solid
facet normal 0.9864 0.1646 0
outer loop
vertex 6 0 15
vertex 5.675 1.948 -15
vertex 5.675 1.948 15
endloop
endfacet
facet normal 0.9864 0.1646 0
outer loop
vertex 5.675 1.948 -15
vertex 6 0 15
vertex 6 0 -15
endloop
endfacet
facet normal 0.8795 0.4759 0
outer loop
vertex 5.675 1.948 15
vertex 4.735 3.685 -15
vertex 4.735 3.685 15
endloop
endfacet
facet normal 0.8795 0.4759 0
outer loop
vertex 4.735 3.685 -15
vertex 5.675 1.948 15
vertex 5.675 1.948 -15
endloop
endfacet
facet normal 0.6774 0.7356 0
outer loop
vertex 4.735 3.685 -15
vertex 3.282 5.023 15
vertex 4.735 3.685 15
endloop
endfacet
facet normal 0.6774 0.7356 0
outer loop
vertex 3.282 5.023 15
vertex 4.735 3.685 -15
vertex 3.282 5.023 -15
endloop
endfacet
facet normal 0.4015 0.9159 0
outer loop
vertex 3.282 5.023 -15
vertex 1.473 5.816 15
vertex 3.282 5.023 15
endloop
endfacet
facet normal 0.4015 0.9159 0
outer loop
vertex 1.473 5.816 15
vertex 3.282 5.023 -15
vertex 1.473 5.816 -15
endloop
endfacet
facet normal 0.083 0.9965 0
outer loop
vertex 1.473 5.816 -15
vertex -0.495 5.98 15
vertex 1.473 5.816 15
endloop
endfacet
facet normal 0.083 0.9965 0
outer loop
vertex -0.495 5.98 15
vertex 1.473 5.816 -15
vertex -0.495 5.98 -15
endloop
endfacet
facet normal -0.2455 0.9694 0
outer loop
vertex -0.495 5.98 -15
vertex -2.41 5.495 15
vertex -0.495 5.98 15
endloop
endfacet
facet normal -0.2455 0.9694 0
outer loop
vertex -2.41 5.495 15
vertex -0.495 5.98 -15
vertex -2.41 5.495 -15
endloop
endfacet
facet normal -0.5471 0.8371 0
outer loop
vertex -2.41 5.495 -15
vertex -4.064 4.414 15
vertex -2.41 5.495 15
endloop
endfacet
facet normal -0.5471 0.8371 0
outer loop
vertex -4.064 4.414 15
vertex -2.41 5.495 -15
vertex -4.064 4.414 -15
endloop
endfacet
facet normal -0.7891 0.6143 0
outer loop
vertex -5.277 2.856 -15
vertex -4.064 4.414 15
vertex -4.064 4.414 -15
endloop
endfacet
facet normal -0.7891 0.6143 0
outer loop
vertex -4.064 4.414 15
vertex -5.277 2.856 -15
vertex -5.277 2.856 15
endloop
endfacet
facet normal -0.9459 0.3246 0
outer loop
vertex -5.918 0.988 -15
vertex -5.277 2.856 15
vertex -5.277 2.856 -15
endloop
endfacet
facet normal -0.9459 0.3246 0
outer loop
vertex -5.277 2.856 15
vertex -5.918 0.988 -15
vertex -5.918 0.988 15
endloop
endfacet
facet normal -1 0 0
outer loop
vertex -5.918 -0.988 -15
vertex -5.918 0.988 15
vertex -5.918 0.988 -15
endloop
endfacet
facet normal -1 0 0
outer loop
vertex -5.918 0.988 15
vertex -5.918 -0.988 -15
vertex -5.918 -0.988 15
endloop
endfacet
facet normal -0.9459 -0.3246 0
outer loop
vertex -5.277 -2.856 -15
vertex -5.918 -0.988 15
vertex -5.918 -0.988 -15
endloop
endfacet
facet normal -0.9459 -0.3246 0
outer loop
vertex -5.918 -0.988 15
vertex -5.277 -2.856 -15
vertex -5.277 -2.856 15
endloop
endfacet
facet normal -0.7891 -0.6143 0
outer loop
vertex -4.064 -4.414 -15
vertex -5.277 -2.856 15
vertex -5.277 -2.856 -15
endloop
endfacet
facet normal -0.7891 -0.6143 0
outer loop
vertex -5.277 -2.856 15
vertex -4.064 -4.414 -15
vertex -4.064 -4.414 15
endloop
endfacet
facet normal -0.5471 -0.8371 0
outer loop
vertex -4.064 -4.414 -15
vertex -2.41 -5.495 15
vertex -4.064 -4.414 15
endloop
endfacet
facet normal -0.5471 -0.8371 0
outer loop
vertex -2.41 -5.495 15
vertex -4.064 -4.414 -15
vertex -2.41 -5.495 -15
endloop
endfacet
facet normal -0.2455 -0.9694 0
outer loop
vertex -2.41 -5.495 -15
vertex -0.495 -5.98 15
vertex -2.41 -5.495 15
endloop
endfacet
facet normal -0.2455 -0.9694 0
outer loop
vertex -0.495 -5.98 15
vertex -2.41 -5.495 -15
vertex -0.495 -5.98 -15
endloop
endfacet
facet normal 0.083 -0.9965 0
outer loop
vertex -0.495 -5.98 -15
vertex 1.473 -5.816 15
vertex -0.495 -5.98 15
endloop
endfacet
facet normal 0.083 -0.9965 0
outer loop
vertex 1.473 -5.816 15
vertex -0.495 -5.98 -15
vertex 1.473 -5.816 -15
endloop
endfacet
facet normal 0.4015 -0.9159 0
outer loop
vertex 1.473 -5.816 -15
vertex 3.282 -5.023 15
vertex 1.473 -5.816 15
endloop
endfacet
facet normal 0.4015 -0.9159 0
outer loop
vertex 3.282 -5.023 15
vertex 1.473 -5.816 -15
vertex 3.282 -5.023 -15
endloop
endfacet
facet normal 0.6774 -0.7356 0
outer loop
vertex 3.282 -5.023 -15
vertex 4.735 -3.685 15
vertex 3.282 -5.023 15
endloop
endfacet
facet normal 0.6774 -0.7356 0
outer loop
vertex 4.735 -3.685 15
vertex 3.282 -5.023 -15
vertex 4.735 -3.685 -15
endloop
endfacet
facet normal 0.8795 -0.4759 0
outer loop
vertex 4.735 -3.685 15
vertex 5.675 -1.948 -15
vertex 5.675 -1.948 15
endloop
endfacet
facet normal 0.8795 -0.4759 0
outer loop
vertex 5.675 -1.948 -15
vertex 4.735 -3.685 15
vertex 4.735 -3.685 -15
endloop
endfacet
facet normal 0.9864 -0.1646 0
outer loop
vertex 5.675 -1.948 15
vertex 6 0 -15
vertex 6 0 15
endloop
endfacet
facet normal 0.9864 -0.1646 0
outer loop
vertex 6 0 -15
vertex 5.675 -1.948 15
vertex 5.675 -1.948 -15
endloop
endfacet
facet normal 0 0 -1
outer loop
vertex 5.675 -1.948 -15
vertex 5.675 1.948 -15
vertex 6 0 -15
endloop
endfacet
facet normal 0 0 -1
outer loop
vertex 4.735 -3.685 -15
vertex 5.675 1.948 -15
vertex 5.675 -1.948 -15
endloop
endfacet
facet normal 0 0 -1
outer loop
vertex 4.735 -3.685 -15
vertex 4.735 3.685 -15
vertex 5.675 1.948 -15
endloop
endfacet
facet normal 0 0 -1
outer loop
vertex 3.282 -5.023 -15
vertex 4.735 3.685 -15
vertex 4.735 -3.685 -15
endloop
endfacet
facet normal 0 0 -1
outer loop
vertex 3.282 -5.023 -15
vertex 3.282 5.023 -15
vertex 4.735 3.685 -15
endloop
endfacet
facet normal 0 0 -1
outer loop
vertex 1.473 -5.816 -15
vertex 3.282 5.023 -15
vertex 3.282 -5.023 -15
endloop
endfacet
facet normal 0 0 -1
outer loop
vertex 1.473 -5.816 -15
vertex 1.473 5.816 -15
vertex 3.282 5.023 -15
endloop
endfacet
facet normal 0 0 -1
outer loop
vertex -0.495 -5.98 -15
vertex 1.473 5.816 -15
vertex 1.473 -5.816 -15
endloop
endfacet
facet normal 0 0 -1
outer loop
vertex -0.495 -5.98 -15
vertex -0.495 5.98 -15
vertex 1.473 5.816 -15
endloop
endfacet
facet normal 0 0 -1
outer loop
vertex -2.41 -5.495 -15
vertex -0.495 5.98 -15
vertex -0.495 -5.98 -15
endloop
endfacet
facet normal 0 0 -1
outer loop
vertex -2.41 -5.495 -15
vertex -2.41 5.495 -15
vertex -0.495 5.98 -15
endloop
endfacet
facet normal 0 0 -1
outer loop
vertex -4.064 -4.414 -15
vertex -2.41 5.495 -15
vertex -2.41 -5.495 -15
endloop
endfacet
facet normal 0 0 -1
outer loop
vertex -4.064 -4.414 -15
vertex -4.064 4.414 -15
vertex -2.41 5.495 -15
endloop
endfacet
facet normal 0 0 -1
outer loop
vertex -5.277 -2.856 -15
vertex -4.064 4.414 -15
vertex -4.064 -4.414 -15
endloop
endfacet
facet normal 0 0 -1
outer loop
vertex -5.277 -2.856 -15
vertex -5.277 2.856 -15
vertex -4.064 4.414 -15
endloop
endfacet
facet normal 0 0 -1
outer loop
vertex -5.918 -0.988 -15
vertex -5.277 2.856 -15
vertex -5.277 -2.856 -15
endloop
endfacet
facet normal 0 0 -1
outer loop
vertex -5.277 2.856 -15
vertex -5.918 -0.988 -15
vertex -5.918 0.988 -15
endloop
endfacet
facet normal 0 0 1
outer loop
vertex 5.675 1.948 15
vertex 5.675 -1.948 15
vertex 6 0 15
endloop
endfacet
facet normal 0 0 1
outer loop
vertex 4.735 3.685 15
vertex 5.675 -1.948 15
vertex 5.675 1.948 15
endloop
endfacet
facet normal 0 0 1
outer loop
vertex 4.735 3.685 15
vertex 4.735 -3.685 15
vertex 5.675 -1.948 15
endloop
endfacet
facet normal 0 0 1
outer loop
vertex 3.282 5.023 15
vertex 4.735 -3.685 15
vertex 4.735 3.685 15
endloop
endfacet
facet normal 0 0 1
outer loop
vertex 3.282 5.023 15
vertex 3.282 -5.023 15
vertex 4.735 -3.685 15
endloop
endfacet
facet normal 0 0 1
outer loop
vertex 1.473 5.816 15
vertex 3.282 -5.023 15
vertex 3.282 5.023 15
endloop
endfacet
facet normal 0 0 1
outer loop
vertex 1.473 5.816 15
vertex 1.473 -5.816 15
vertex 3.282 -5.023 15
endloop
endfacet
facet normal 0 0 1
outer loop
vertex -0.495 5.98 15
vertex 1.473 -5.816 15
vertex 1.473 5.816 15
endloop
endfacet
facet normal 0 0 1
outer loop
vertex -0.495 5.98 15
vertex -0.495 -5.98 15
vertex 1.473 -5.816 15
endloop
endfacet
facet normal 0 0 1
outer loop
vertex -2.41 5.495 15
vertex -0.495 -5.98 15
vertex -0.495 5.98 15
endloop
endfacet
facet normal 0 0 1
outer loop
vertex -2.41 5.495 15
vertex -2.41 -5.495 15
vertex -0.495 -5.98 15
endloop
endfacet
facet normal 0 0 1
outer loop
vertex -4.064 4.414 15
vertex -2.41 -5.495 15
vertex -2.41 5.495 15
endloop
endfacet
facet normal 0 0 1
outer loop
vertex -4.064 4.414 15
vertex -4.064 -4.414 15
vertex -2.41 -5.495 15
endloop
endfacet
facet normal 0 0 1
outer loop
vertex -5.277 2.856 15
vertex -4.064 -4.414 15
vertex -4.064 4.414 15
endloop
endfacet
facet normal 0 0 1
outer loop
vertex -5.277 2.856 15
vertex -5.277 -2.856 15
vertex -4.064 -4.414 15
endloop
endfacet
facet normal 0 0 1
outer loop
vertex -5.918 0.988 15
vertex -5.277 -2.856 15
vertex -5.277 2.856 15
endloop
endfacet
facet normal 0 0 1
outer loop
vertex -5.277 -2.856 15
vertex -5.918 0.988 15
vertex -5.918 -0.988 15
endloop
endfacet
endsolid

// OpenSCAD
// Volume: 3331.4160706583143, SurfaceArea: 1347.9213205532076
difference() {
  sphere(r=10);
  !cylinder(h=30, r=6, center=true);
}
